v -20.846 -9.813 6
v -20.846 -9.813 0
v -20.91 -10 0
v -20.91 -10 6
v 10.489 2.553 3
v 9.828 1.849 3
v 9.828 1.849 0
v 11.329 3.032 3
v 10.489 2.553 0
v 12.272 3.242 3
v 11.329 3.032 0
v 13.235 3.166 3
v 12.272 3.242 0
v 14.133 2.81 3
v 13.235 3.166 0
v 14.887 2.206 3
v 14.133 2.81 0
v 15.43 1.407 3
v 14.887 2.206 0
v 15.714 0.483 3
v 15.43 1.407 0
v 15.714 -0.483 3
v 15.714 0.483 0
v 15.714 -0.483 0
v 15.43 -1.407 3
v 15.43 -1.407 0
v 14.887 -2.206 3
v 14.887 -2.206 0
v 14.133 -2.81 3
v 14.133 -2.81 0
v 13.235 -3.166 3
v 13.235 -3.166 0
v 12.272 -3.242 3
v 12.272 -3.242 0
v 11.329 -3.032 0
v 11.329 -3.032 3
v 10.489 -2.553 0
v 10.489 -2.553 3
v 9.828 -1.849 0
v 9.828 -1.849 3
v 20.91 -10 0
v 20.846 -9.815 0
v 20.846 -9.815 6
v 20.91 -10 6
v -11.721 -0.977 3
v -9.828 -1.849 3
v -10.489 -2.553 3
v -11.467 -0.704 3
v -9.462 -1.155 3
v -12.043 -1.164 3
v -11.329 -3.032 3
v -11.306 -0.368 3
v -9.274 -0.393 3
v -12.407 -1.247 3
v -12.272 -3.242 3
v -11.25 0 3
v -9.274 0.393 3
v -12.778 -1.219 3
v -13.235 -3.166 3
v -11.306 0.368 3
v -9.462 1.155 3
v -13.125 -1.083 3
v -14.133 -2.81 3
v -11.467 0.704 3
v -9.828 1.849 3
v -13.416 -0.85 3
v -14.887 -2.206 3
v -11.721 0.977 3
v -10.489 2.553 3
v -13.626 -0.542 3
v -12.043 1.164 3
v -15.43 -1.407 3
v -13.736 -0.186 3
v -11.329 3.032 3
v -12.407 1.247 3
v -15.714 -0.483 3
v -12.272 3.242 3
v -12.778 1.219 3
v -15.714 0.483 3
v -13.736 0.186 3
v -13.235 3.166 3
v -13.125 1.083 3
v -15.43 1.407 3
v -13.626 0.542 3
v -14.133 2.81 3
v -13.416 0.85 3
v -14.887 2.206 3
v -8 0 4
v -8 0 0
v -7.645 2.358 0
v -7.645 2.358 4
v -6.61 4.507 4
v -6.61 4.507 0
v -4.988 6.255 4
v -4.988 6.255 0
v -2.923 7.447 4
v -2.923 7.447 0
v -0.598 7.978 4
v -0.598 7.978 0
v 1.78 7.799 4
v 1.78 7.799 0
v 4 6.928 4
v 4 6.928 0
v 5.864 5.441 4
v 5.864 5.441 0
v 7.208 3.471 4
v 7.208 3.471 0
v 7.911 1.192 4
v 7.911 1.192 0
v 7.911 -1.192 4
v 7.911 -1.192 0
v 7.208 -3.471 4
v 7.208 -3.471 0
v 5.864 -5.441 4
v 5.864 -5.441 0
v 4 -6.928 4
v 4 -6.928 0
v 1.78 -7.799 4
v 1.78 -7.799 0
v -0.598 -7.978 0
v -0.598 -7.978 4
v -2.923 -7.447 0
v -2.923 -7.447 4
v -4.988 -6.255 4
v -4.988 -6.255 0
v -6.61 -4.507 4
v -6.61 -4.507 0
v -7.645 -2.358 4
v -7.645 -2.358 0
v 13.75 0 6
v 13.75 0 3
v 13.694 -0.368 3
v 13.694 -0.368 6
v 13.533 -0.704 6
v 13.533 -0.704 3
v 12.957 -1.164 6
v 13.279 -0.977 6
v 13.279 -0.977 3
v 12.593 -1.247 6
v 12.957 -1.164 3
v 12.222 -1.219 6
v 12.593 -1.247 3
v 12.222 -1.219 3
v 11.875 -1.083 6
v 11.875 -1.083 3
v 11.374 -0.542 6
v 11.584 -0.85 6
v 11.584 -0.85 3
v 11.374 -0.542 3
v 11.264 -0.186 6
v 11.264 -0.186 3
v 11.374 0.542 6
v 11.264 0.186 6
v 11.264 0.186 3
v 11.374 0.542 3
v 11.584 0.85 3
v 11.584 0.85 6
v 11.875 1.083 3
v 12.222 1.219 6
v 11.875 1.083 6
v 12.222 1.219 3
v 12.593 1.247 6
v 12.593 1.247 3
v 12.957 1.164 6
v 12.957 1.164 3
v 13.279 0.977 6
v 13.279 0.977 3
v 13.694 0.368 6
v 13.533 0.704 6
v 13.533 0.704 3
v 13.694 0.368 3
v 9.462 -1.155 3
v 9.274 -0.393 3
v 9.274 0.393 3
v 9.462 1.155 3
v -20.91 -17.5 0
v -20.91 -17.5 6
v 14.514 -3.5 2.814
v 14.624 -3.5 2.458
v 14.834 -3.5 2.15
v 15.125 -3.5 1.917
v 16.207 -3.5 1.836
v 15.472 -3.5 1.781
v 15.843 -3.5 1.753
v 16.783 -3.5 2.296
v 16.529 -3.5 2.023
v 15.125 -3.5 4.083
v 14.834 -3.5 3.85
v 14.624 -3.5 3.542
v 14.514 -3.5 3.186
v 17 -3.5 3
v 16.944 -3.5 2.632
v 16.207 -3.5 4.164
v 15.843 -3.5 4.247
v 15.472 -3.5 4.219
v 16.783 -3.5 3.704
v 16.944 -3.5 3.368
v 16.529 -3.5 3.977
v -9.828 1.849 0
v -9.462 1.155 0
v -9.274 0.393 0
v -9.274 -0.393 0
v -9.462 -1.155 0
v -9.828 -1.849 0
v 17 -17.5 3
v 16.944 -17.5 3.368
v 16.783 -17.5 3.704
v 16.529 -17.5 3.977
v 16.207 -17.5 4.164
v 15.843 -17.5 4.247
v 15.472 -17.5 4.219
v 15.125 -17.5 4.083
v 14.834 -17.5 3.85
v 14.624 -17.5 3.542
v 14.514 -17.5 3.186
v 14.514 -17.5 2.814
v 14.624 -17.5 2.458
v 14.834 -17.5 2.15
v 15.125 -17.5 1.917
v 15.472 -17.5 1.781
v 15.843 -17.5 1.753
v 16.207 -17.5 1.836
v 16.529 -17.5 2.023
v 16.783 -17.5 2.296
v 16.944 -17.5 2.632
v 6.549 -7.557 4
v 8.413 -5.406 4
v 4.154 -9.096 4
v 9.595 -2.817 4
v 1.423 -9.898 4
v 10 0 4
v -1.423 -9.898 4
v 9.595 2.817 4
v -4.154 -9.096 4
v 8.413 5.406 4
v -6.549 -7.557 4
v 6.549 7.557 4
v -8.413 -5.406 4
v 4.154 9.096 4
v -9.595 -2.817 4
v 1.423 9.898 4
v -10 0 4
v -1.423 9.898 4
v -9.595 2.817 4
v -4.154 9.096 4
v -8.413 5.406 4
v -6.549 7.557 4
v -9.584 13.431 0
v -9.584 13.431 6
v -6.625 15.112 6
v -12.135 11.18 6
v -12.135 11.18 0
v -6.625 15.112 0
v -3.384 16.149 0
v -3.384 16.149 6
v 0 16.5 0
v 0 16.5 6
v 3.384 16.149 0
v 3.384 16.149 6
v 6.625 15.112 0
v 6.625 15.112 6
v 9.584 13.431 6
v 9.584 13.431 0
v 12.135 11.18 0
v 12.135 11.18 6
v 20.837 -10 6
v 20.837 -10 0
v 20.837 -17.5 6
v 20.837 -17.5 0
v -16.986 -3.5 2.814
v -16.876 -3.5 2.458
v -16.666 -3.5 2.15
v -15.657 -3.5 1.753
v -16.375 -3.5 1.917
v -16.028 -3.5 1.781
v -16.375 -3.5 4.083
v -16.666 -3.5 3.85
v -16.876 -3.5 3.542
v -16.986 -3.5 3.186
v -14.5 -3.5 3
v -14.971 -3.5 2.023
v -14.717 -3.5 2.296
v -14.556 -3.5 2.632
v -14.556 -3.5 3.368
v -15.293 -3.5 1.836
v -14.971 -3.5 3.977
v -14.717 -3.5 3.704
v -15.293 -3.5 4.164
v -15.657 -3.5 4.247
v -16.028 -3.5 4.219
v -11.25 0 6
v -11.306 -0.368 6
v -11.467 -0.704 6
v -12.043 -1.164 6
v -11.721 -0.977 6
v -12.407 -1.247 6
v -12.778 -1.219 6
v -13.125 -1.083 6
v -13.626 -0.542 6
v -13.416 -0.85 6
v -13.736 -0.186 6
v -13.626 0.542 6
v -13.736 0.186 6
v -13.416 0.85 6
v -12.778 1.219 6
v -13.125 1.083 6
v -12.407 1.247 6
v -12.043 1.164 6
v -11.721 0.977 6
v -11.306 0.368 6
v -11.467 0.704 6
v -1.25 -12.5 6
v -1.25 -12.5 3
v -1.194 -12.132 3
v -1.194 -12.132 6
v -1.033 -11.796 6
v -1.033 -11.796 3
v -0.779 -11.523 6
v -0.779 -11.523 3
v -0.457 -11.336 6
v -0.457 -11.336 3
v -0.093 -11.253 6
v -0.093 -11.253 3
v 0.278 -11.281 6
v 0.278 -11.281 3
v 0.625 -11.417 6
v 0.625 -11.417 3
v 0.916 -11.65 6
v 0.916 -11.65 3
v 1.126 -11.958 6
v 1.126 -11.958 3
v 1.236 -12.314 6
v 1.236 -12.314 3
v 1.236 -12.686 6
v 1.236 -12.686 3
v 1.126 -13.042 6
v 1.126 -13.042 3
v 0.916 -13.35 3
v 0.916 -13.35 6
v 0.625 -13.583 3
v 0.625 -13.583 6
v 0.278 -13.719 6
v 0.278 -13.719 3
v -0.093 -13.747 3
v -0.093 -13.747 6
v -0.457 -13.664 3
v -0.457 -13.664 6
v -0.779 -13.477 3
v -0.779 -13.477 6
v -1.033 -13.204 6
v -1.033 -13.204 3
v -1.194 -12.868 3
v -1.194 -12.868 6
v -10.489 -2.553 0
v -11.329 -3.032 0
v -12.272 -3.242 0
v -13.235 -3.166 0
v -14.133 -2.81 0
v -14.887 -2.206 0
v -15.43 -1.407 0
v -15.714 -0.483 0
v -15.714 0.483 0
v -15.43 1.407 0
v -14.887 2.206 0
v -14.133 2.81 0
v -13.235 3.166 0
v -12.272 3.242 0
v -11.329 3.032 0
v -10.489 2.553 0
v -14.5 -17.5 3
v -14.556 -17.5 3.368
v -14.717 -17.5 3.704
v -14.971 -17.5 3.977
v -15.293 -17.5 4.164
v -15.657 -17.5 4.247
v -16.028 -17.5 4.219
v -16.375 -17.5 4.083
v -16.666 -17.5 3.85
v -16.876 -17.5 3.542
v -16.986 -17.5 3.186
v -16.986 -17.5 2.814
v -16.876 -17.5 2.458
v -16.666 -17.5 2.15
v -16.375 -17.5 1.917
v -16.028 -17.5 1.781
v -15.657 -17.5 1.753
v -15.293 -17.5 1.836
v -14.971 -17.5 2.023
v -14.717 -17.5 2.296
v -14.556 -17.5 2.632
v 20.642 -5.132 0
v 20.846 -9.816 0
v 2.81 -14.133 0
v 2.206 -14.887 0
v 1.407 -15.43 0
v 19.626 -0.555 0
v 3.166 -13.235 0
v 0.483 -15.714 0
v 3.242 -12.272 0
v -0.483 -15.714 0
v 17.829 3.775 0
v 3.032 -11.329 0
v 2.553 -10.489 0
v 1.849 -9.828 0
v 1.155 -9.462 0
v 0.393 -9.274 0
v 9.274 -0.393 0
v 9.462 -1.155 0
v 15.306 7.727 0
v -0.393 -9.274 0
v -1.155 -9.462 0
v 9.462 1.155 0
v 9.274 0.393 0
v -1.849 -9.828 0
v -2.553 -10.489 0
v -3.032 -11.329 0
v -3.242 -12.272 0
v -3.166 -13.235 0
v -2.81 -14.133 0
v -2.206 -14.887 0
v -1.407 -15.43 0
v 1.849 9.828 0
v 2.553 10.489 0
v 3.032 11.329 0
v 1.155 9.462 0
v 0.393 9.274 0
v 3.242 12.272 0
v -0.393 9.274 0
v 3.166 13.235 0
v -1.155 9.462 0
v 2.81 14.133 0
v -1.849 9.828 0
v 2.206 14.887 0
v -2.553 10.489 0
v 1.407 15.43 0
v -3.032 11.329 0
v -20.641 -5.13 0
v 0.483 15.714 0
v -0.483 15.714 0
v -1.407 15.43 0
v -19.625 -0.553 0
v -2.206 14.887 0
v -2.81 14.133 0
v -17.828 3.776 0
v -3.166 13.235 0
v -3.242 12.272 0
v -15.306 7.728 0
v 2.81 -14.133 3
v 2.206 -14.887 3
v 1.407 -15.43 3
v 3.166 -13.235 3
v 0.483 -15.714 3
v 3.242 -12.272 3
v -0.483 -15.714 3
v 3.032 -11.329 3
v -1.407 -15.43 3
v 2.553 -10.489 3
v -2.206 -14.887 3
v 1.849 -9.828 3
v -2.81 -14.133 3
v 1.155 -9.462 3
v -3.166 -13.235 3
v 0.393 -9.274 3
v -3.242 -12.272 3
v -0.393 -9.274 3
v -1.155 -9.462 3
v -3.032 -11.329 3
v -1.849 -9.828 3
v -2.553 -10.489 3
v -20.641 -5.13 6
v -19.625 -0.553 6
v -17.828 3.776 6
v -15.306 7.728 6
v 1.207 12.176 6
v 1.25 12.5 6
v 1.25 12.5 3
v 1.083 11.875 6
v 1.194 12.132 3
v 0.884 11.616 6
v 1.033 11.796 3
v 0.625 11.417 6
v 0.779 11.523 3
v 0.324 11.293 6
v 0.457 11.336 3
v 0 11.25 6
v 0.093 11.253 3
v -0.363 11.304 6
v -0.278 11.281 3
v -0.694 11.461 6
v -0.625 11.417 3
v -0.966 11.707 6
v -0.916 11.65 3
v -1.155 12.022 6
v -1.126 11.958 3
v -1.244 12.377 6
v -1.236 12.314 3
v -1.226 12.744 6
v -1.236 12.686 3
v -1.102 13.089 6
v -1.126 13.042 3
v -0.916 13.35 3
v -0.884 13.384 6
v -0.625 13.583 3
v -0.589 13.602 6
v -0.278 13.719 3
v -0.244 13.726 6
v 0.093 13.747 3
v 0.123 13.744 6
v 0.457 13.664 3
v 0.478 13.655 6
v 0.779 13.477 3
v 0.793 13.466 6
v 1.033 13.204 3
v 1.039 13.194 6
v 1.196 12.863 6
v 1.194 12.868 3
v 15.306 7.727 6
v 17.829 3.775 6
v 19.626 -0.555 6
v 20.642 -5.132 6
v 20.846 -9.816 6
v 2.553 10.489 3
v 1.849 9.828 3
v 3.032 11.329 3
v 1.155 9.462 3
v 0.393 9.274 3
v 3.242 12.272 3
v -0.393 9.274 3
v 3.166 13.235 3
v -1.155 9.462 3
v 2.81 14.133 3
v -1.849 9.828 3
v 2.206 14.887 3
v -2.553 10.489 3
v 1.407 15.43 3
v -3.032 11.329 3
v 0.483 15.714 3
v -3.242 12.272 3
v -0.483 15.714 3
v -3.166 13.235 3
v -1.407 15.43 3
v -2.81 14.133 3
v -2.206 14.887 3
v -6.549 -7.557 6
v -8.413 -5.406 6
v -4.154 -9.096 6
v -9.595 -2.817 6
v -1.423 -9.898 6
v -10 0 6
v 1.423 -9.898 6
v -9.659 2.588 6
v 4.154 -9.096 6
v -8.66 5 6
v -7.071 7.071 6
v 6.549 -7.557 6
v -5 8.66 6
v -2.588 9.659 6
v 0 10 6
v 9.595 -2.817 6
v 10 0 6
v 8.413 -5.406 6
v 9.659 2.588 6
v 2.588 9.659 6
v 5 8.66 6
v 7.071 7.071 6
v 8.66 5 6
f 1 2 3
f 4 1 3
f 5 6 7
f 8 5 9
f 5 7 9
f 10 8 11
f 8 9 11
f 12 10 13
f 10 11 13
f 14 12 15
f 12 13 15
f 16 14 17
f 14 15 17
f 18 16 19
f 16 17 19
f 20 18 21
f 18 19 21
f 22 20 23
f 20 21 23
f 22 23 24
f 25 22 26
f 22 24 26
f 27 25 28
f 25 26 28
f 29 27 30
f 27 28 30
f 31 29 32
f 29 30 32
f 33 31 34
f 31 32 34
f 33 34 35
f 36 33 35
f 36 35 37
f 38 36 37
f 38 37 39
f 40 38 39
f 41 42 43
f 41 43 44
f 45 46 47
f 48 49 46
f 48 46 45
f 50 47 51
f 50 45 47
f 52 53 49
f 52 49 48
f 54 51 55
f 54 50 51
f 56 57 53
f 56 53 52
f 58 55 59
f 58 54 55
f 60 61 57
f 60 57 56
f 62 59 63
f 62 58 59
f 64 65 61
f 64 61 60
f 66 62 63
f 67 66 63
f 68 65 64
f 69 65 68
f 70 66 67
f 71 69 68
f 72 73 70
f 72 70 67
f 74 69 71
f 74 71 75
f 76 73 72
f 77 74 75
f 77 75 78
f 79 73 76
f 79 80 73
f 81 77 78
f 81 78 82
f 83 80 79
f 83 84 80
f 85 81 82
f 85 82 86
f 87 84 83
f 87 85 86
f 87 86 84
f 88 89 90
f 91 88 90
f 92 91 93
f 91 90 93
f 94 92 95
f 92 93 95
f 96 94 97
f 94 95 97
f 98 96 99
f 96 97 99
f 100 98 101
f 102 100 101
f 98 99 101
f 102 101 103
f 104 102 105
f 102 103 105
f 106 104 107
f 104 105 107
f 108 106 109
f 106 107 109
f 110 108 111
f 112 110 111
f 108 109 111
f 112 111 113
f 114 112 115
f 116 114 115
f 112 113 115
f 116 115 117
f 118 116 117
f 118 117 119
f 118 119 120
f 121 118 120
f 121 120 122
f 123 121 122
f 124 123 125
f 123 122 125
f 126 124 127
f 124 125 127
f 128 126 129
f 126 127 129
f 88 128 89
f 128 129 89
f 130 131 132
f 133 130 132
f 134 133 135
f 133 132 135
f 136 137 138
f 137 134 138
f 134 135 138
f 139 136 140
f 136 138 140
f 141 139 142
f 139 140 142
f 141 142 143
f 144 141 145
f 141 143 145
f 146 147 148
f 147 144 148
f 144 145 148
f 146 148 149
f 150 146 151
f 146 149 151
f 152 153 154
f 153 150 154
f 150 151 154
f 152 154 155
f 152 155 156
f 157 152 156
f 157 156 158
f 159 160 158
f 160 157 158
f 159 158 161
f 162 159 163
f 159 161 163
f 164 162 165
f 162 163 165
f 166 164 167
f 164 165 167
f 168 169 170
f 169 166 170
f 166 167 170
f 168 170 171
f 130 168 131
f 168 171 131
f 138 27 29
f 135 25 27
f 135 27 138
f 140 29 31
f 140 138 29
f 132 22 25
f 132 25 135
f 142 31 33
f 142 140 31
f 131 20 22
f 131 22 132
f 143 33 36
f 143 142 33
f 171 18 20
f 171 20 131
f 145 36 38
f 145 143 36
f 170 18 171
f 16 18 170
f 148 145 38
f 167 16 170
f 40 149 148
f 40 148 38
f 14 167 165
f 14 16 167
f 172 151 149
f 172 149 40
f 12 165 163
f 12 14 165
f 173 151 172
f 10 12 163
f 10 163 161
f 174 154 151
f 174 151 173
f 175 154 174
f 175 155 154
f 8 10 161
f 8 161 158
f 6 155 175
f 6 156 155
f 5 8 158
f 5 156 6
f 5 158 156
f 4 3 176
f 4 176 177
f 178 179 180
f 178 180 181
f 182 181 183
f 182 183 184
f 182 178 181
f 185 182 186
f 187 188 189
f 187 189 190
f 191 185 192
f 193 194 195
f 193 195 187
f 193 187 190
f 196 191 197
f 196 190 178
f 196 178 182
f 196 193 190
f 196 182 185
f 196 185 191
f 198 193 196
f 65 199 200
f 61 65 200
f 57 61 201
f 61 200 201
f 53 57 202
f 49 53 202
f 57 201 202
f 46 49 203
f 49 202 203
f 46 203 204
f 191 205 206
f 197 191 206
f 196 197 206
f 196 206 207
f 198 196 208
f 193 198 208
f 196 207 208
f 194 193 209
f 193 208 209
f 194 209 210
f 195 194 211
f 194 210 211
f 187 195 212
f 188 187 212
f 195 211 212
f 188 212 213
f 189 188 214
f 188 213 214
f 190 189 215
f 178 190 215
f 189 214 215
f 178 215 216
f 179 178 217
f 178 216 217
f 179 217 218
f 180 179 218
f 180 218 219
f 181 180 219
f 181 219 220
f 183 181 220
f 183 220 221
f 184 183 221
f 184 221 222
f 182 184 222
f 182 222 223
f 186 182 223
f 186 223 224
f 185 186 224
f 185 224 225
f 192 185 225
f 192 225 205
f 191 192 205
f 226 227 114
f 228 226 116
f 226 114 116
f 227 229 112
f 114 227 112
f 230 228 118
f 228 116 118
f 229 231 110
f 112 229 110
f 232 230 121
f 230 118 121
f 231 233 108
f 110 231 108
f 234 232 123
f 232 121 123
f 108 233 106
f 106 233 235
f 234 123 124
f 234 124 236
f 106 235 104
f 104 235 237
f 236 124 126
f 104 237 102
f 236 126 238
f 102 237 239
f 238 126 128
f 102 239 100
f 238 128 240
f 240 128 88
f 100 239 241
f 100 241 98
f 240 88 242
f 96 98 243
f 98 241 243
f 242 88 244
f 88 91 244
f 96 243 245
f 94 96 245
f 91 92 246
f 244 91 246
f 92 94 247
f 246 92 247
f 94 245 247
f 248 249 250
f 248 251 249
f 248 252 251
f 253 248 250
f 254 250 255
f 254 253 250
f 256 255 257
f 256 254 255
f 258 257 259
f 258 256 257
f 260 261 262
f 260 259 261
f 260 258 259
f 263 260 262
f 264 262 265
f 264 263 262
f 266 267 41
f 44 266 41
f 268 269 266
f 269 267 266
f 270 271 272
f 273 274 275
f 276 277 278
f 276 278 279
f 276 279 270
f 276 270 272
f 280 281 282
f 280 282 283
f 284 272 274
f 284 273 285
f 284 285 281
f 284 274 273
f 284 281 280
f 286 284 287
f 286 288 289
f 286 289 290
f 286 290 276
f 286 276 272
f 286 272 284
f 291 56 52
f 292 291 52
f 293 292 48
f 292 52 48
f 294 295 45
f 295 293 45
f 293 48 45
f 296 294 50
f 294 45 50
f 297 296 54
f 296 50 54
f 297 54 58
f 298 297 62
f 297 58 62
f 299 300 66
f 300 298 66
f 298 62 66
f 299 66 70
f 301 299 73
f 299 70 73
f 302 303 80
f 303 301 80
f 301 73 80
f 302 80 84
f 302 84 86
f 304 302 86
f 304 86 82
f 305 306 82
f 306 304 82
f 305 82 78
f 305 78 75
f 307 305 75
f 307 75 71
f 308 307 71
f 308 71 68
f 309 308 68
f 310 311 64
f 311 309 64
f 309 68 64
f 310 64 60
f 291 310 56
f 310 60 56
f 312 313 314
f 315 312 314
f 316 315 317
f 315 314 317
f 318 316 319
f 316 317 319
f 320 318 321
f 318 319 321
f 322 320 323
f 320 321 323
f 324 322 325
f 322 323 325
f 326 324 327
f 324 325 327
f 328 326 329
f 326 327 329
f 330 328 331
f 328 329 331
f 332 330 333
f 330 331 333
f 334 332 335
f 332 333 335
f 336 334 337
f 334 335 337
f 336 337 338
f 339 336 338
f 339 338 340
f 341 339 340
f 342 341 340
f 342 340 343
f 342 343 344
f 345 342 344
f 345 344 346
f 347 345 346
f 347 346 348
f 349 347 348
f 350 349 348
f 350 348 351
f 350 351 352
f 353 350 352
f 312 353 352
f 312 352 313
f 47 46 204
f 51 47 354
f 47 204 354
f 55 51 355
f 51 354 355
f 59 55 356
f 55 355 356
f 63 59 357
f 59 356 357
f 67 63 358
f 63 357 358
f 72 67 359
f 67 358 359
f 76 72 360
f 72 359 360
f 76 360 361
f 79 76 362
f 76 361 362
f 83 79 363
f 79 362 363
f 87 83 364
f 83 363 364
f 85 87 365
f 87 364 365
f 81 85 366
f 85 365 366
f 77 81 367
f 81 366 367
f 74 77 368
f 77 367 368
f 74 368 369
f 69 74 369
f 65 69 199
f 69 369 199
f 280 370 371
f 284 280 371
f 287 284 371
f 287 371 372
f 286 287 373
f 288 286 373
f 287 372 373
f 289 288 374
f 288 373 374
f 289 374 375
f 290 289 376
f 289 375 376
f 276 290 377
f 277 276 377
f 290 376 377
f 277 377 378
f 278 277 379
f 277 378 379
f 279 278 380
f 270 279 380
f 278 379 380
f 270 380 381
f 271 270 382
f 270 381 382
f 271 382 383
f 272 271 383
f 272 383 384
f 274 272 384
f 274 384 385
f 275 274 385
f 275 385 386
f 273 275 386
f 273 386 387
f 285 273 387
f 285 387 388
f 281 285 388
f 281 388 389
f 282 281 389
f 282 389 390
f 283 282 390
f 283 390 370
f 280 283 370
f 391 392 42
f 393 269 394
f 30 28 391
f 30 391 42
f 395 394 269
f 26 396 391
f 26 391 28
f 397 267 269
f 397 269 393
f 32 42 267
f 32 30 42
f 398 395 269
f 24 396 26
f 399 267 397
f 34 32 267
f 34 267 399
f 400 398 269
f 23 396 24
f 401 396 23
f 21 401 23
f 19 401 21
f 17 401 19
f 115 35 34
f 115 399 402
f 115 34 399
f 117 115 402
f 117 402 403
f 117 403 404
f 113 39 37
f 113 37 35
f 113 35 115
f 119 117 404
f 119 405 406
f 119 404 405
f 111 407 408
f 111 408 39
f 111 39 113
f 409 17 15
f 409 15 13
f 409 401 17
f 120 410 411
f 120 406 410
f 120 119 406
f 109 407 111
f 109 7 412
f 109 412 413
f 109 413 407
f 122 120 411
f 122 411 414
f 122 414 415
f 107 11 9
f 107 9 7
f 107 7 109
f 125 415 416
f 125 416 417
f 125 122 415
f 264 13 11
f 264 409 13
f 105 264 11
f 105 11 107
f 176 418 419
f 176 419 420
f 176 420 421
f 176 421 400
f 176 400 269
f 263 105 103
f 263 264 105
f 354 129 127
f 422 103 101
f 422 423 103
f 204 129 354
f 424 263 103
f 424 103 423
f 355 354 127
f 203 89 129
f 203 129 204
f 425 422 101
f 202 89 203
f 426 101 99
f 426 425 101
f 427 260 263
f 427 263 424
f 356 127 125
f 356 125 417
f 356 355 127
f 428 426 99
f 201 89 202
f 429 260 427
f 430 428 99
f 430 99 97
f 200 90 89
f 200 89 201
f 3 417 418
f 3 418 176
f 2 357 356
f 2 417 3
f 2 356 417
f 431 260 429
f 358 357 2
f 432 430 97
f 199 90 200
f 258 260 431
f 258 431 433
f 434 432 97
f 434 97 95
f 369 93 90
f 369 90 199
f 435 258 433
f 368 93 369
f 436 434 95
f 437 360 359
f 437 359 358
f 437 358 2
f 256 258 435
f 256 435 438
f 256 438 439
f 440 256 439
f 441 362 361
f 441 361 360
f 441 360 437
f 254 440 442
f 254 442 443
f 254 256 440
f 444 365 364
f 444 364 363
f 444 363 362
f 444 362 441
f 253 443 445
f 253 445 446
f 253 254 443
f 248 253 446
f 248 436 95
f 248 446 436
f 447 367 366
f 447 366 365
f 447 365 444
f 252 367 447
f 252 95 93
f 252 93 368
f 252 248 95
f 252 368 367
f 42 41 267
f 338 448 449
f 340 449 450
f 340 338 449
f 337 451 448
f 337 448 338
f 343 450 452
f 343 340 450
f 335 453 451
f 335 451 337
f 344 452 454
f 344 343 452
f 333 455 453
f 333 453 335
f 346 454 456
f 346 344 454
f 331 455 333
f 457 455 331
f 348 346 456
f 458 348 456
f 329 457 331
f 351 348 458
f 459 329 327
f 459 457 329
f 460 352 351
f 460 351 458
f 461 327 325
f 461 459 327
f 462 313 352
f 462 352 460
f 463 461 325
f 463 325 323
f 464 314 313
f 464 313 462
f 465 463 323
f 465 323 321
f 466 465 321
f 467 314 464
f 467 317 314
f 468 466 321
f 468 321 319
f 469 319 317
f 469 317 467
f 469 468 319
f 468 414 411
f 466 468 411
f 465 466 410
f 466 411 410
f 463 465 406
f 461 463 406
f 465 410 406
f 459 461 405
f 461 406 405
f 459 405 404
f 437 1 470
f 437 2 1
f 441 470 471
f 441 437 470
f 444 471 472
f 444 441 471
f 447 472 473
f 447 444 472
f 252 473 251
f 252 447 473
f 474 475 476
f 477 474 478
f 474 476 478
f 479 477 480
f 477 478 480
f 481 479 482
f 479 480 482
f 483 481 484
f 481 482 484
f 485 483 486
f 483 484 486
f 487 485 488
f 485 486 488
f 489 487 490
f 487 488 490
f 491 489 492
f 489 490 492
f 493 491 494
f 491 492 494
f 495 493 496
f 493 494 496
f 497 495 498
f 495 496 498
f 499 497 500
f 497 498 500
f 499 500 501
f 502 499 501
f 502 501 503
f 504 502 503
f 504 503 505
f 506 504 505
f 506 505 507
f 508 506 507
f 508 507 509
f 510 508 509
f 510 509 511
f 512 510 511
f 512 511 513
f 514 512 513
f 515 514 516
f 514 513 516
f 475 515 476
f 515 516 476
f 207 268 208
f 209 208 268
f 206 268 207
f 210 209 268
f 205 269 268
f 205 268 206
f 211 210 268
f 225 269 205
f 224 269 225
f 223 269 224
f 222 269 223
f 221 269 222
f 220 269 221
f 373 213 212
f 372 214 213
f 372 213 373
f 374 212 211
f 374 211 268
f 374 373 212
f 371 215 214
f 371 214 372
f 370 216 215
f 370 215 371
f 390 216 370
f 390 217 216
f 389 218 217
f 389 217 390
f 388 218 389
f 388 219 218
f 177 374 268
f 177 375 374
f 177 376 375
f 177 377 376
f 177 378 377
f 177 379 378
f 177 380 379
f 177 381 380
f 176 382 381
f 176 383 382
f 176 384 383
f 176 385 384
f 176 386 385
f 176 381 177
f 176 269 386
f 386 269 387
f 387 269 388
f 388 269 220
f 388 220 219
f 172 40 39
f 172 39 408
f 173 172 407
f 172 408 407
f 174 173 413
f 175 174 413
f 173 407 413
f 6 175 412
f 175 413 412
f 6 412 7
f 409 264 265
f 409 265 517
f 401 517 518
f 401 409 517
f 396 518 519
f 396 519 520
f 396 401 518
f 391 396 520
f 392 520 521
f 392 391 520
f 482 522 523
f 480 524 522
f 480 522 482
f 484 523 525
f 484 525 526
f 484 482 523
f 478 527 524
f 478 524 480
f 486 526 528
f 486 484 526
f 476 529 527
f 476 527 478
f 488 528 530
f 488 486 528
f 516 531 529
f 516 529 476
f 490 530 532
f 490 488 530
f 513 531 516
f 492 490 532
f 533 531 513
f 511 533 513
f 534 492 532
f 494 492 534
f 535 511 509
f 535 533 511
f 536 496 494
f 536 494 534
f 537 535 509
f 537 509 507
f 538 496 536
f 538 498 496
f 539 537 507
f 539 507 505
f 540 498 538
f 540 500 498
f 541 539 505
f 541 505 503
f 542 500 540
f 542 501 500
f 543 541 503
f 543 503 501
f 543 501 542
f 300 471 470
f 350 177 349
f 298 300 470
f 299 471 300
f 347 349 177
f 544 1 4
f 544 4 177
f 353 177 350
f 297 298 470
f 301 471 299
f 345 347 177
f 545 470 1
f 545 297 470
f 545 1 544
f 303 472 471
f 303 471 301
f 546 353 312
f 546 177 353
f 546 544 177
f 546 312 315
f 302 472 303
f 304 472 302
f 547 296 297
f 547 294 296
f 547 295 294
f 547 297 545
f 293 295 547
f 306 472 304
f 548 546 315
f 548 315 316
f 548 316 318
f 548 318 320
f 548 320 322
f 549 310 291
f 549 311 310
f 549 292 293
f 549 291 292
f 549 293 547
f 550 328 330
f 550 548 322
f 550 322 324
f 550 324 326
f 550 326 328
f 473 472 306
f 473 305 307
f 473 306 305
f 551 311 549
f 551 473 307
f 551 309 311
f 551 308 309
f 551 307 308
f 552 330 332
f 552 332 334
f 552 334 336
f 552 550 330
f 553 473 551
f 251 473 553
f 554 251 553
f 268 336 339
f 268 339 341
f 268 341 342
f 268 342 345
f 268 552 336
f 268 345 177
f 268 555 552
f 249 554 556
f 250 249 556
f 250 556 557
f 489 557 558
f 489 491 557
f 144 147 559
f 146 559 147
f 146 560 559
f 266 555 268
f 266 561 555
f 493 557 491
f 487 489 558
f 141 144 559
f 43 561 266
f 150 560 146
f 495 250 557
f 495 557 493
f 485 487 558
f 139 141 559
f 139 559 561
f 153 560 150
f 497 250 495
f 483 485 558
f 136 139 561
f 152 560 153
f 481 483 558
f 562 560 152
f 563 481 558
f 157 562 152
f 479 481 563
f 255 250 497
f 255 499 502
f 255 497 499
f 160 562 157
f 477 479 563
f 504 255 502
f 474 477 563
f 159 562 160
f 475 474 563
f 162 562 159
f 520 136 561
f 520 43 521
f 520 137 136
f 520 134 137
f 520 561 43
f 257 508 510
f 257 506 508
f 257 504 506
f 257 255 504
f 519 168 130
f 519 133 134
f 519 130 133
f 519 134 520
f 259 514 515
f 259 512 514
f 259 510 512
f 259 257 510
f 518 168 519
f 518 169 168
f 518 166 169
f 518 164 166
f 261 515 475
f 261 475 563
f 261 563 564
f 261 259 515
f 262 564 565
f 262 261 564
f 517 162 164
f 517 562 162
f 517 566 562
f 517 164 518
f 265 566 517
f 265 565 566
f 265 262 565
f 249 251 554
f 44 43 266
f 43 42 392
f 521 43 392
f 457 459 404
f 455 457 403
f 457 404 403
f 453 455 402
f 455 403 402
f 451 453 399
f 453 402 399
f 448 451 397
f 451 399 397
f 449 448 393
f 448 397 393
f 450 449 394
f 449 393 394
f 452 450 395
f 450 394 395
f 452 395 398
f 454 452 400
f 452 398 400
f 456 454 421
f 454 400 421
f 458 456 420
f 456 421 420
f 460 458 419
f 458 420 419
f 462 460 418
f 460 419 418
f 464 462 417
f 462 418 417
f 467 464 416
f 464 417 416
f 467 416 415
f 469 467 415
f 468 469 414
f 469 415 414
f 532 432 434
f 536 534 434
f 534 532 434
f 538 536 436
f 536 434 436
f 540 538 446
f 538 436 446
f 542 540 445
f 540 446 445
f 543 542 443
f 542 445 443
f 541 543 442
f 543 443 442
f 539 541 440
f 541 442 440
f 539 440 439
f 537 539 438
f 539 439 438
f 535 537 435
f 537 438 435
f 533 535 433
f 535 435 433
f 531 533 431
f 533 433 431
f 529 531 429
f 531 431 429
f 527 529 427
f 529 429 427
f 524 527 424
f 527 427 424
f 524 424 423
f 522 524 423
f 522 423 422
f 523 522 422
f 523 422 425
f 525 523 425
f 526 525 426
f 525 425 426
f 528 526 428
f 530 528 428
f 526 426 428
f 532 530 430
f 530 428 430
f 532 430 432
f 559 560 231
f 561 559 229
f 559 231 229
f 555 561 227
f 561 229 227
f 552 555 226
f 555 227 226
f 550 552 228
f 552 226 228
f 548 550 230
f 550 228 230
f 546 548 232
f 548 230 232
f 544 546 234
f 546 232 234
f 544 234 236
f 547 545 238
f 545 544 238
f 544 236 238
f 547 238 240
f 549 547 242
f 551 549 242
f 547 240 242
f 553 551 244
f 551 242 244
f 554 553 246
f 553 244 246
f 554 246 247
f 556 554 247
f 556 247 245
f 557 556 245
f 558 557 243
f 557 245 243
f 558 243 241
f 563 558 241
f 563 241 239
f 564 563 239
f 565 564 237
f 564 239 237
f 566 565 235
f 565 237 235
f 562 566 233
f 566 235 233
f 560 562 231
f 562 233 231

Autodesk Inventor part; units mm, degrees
ref_plane "YZ Plane" through (0, 0, 0) normal (1, 0, 0) x (0, 1, 0)
ref_plane "XZ Plane" through (0, 0, 0) normal (0, 1, 0) x (-1, 0, 0)
ref_plane "XY Plane" through (0, 0, 0) normal (0, 0, 1) x (1, 0, 0)
sketch "Sketch1" plane through (0, 0, 0) normal (0, 0, 1) x (1, 0, 0)
  circle A0 centre (0, 0) radius 10
  arc A1 (13.1244, -10) -> (-13.1244, -10) centre (0, 0) ccw
  line L0 (13.1244, -10) -> (25, -10)
  line L1 (25, -10) -> (0, -10)
  line L2 (-13.1244, -10) -> (-25, -10)
  line L3 (0, 0) -> (0, -17.5)
  line L4 (0, -17.5) -> (-25, -17.5)
  line L5 (-25, -17.5) -> (-25, -10)
  line L6 (25, -10) -> (25, -17.5)
  line L7 (25, -17.5) -> (0, -17.5)
  line L8 (0, 0) -> (-12.5, 0)
  circle A2 centre (-12.5, 0) radius 1.25
  line L9 (0, 0) -> (0, 12.5)
  circle A3 centre (0, 12.5) radius 1.25
  circle A4 centre (12.5, 0) radius 1.25
  circle A5 centre (0, -12.5) radius 1.25
  circle A6 centre (12.5, 0) radius 3.25
  circle A7 centre (-12.5, 0) radius 3.25
  line L10 (0, 0) -> (2.11, 2.11)
  line L11 (0, 0) -> (2.984, 0) construction
  circle A8 centre (0, 12.5) radius 3.25
  circle A9 centre (0, -12.5) radius 3.25
  dimension "d0" = 20
  dimension "d1" = 33
  dimension "d2" = 25
  dimension "d3" = 25
  dimension "d4" = 17.5
  dimension "d5" = 25
  dimension "d6" = 12.5
  dimension "d7" = 2.5
  dimension "d8" = 12.5
  dimension "d9" = 2.5
  dimension "d15" = 6.5
  dimension "d16" = 45
  dimension "d17" = 6.5
  dimension "d18" = 6.5
extrude "Extrusion1" add sketch "Sketch1" along normal blind 6 contours A0 A6 | A0 A8 A7 A9 L3 L4 L5 L2 A1 L1 A6 | A0 A8 | A9 L1 A0 | L3 A5 A9 A0 | L1 A9 L3 A5 | L1 L0 L6 L7 L3 A9 | A5 L3 | L3 A5 | A0 A7 picked at (10.6028, 1.4923)
fillet "Fillet1" radius 5 2 edges at (13.1244, -10, 3) (-13.1244, -10, 3)
sketch "Sketch2" plane through (0, 0, 0) normal (0, 0, -1) x (-1, 0, 0)
  circle A0 centre (0, 12.5) radius 1.25 projected
  line L0 (0, 0) -> (-3.0567, 0)
  circle A1 centre (0, -12.5) radius 1.25
extrude "Extrusion2" cut sketch "Sketch2" against normal blind 10 contours A1
sketch "Sketch3" plane through (0, 0, 0) normal (0, 0, -1) x (-1, 0, 0)
  circle A0 centre (-12.5, 0) radius 1.25 projected
  circle A1 centre (0, -12.5) radius 1.25 projected
  circle A2 centre (0, 0) radius 10 projected
  circle A3 centre (-12.5, 0) radius 1.25 projected
  circle A4 centre (0, 12.5) radius 1.25 projected
  circle A5 centre (12.5, 0) radius 1.25 projected
  line L0 (25, -17.5) -> (-25, -17.5) projected
  line L1 (25, -10) -> (25, -17.5) projected
  line L2 (20.9105, -10) -> (25, -10) projected
  arc A6 (16.0476, -3.8372) -> (20.9105, -10) centre (20.9105, -5) ccw projected
  arc A7 (16.0476, -3.8372) -> (-16.0476, -3.8372) centre (0, 0) ccw projected
  arc A8 (-20.9105, -10) -> (-16.0476, -3.8372) centre (-20.9105, -5) ccw projected
  line L3 (-25, -10) -> (-20.9105, -10) projected
  line L4 (-25, -17.5) -> (-25, -10) projected
  circle A9 centre (-12.5, 0) radius 3.25
  circle A10 centre (0, 12.5) radius 3.25
  circle A11 centre (12.5, 0) radius 1.25 projected
  circle A12 centre (12.5, 0) radius 3.25
  circle A13 centre (0, -12.5) radius 3.25
  dimension "d19" = 6.5
  dimension "d20" = 6.5
  dimension "d21" = 6.5
  dimension "d22" = 6.5
extrude "Extrusion3" cut sketch "Sketch3" against normal blind 3 contours A2 A12 | A2 A12 | A10 A2 | A2 A10 | A13 A2 | A2 A13 | A9 A2 | A2 A9
sketch "Sketch4" plane through (0, 0, 0) normal (0, 0, -1) x (-1, 0, 0)
  arc A0 (16.0476, -3.8372) -> (-16.0476, -3.8372) centre (0, 0) ccw projected
  line L0 (-25, -10) -> (-20.9105, -10) projected
  line L1 (-16.0476, 3.8372) -> (-20.9105, -10)
  line L2 (15.5959, 5.3868) -> (20.9105, -10)
  arc A1 (16.0476, -3.8372) -> (20.9105, -10) centre (20.9105, -5) ccw projected
  arc A2 (-20.9105, -10) -> (-16.0476, -3.8372) centre (-20.9105, -5) ccw projected
extrude "Extrusion4" add sketch "Sketch4" against normal up to surface (6 mm away)
sketch "Sketch5" plane through (-25, -17.5, 0) normal (0, -1, 0) x (1, 0, 0)
  line L0 (0, 6) -> (50, 6) projected
  line L1 (0, 0) -> (50, 0) projected
  circle A0 centre (40.75, 3) radius 1.25
  circle A1 centre (9.25, 3) radius 1.25
  point P0 (25, 0)
  dimension "d27" = 2.5
extrude "Extrusion5" cut sketch "Sketch5" against normal blind 14
sketch "Sketch6" plane through (-25, -17.5, 0) normal (0, -1, 0) x (1, 0, 0)
  circle A0 centre (9.25, 3) radius 1.25 projected
  circle A1 centre (40.75, 3) radius 1.25 projected
  point P0 (25, 0)
  dimension "d30" = 31.5
sketch "Sketch8" plane through (-25, -10, 6) normal (0, 1, 0) x (1, 0, 0)
  line L0 (9.4041, 6) -> (41.0476, 6) projected
  line L1 (4.0895, 6) -> (4.0895, 0) projected
  line L2 (9.4041, 6) -> (4.0895, 6)
  line L3 (4.0895, 6) -> (4.0895, 0)
  line L4 (4.0895, 0) -> (9.4041, 0)
  line L5 (9.4041, 0) -> (9.4041, 6)
  line L6 (45.8371, 0) -> (50, 0)
  line L7 (50, 0) -> (50, 6)
  line L8 (50, 6) -> (45.8371, 6)
  line L9 (45.8371, 6) -> (45.8371, 0)
  line L10 (0, 0) -> (4.0895, 0)
  line L11 (4.0895, 0) -> (4.0895, 6)
  line L12 (4.0895, 6) -> (0, 6)
  line L13 (0, 6) -> (0, 0)
  point P0 (25, 6)
extrude "Extrusion7" cut sketch "Sketch8" against normal blind 14 contours L1 L10 L13 L12 | L9 L8 L7 L6
sketch "Sketch9" plane through (0, 0, 0) normal (0, 0, -1) x (-1, 0, 0)
  arc A0 (-1.8494, 9.8275) -> (-9.8275, 1.8494) centre (0, 0) ccw projected
  arc A1 (-9.8275, 1.8494) -> (-9.8275, -1.8494) centre (0, 0) ccw projected
  arc A2 (-9.8275, -1.8494) -> (-1.8494, -9.8275) centre (0, 0) ccw projected
  arc A3 (-1.8494, -9.8275) -> (1.8494, -9.8275) centre (0, 0) ccw projected
  arc A4 (1.8494, -9.8275) -> (9.8275, -1.8494) centre (0, 0) ccw projected
  arc A5 (9.8275, -1.8494) -> (9.8275, 1.8494) centre (0, 0) ccw projected
  arc A6 (9.8275, 1.8494) -> (1.8494, 9.8275) centre (0, 0) ccw projected
  arc A7 (1.8494, 9.8275) -> (-1.8494, 9.8275) centre (0, 0) ccw projected
  circle A8 centre (0, 0) radius 8
  dimension "d37" = 16
extrude "Extrusion8" add sketch "Sketch9" against normal blind 4
sketch "Sketch11" plane through (0, 0, 0) normal (0, 0, -1) x (-1, 0, 0)
  arc A0 (-9.8275, 1.8494) -> (-9.8275, -1.8494) centre (-12.5, 0) ccw projected
  circle A1 centre (-12.5, 0) radius 3.25
  arc A2 (1.8494, 9.8275) -> (-1.8494, 9.8275) centre (0, 12.5) ccw projected
  arc A3 (9.8275, -1.8494) -> (9.8275, 1.8494) centre (0, 0) ccw projected
  arc A4 (9.8275, -1.8494) -> (9.8275, 1.8494) centre (12.5, 0) ccw projected
  circle A5 centre (12.5, 0) radius 1.25 projected
  arc A6 (-1.8494, -9.8275) -> (1.8494, -9.8275) centre (0, 0) ccw projected
  arc A7 (-1.8494, -9.8275) -> (1.8494, -9.8275) centre (0, -12.5) ccw projected
  circle A8 centre (0, -12.5) radius 1.25 projected
  circle A9 centre (0, 12.5) radius 3.25
  circle A10 centre (12.5, 0) radius 3.25
  circle A11 centre (0, -12.5) radius 3.25
extrude "Extrusion9" cut sketch "Sketch11" against normal up to surface (3 mm away)
sketch "Sketch12" plane through (0, 0, 0) normal (0, 0, -1) x (-1, 0, 0)
  line L0 (-20.8371, -10) -> (-20.8371, -17.5) projected
  arc A0 (-12.135, 11.18) -> (-20.8371, -10) centre (5.9768, -8.6392) ccw
  line L1 (-12.135, 11.18) -> (-20.8458, -9.8158)
  line L2 (0, 0) -> (0, 1.5642)
  arc A1 (20.8371, -10) -> (12.135, 11.18) centre (-5.9768, -8.6392) ccw
  line L3 (12.135, 11.18) -> (20.8458, -9.8158)
extrude "Extrusion10" add sketch "Sketch12" against normal up to surface (6 mm away)
properties part number "ROTATION1"
